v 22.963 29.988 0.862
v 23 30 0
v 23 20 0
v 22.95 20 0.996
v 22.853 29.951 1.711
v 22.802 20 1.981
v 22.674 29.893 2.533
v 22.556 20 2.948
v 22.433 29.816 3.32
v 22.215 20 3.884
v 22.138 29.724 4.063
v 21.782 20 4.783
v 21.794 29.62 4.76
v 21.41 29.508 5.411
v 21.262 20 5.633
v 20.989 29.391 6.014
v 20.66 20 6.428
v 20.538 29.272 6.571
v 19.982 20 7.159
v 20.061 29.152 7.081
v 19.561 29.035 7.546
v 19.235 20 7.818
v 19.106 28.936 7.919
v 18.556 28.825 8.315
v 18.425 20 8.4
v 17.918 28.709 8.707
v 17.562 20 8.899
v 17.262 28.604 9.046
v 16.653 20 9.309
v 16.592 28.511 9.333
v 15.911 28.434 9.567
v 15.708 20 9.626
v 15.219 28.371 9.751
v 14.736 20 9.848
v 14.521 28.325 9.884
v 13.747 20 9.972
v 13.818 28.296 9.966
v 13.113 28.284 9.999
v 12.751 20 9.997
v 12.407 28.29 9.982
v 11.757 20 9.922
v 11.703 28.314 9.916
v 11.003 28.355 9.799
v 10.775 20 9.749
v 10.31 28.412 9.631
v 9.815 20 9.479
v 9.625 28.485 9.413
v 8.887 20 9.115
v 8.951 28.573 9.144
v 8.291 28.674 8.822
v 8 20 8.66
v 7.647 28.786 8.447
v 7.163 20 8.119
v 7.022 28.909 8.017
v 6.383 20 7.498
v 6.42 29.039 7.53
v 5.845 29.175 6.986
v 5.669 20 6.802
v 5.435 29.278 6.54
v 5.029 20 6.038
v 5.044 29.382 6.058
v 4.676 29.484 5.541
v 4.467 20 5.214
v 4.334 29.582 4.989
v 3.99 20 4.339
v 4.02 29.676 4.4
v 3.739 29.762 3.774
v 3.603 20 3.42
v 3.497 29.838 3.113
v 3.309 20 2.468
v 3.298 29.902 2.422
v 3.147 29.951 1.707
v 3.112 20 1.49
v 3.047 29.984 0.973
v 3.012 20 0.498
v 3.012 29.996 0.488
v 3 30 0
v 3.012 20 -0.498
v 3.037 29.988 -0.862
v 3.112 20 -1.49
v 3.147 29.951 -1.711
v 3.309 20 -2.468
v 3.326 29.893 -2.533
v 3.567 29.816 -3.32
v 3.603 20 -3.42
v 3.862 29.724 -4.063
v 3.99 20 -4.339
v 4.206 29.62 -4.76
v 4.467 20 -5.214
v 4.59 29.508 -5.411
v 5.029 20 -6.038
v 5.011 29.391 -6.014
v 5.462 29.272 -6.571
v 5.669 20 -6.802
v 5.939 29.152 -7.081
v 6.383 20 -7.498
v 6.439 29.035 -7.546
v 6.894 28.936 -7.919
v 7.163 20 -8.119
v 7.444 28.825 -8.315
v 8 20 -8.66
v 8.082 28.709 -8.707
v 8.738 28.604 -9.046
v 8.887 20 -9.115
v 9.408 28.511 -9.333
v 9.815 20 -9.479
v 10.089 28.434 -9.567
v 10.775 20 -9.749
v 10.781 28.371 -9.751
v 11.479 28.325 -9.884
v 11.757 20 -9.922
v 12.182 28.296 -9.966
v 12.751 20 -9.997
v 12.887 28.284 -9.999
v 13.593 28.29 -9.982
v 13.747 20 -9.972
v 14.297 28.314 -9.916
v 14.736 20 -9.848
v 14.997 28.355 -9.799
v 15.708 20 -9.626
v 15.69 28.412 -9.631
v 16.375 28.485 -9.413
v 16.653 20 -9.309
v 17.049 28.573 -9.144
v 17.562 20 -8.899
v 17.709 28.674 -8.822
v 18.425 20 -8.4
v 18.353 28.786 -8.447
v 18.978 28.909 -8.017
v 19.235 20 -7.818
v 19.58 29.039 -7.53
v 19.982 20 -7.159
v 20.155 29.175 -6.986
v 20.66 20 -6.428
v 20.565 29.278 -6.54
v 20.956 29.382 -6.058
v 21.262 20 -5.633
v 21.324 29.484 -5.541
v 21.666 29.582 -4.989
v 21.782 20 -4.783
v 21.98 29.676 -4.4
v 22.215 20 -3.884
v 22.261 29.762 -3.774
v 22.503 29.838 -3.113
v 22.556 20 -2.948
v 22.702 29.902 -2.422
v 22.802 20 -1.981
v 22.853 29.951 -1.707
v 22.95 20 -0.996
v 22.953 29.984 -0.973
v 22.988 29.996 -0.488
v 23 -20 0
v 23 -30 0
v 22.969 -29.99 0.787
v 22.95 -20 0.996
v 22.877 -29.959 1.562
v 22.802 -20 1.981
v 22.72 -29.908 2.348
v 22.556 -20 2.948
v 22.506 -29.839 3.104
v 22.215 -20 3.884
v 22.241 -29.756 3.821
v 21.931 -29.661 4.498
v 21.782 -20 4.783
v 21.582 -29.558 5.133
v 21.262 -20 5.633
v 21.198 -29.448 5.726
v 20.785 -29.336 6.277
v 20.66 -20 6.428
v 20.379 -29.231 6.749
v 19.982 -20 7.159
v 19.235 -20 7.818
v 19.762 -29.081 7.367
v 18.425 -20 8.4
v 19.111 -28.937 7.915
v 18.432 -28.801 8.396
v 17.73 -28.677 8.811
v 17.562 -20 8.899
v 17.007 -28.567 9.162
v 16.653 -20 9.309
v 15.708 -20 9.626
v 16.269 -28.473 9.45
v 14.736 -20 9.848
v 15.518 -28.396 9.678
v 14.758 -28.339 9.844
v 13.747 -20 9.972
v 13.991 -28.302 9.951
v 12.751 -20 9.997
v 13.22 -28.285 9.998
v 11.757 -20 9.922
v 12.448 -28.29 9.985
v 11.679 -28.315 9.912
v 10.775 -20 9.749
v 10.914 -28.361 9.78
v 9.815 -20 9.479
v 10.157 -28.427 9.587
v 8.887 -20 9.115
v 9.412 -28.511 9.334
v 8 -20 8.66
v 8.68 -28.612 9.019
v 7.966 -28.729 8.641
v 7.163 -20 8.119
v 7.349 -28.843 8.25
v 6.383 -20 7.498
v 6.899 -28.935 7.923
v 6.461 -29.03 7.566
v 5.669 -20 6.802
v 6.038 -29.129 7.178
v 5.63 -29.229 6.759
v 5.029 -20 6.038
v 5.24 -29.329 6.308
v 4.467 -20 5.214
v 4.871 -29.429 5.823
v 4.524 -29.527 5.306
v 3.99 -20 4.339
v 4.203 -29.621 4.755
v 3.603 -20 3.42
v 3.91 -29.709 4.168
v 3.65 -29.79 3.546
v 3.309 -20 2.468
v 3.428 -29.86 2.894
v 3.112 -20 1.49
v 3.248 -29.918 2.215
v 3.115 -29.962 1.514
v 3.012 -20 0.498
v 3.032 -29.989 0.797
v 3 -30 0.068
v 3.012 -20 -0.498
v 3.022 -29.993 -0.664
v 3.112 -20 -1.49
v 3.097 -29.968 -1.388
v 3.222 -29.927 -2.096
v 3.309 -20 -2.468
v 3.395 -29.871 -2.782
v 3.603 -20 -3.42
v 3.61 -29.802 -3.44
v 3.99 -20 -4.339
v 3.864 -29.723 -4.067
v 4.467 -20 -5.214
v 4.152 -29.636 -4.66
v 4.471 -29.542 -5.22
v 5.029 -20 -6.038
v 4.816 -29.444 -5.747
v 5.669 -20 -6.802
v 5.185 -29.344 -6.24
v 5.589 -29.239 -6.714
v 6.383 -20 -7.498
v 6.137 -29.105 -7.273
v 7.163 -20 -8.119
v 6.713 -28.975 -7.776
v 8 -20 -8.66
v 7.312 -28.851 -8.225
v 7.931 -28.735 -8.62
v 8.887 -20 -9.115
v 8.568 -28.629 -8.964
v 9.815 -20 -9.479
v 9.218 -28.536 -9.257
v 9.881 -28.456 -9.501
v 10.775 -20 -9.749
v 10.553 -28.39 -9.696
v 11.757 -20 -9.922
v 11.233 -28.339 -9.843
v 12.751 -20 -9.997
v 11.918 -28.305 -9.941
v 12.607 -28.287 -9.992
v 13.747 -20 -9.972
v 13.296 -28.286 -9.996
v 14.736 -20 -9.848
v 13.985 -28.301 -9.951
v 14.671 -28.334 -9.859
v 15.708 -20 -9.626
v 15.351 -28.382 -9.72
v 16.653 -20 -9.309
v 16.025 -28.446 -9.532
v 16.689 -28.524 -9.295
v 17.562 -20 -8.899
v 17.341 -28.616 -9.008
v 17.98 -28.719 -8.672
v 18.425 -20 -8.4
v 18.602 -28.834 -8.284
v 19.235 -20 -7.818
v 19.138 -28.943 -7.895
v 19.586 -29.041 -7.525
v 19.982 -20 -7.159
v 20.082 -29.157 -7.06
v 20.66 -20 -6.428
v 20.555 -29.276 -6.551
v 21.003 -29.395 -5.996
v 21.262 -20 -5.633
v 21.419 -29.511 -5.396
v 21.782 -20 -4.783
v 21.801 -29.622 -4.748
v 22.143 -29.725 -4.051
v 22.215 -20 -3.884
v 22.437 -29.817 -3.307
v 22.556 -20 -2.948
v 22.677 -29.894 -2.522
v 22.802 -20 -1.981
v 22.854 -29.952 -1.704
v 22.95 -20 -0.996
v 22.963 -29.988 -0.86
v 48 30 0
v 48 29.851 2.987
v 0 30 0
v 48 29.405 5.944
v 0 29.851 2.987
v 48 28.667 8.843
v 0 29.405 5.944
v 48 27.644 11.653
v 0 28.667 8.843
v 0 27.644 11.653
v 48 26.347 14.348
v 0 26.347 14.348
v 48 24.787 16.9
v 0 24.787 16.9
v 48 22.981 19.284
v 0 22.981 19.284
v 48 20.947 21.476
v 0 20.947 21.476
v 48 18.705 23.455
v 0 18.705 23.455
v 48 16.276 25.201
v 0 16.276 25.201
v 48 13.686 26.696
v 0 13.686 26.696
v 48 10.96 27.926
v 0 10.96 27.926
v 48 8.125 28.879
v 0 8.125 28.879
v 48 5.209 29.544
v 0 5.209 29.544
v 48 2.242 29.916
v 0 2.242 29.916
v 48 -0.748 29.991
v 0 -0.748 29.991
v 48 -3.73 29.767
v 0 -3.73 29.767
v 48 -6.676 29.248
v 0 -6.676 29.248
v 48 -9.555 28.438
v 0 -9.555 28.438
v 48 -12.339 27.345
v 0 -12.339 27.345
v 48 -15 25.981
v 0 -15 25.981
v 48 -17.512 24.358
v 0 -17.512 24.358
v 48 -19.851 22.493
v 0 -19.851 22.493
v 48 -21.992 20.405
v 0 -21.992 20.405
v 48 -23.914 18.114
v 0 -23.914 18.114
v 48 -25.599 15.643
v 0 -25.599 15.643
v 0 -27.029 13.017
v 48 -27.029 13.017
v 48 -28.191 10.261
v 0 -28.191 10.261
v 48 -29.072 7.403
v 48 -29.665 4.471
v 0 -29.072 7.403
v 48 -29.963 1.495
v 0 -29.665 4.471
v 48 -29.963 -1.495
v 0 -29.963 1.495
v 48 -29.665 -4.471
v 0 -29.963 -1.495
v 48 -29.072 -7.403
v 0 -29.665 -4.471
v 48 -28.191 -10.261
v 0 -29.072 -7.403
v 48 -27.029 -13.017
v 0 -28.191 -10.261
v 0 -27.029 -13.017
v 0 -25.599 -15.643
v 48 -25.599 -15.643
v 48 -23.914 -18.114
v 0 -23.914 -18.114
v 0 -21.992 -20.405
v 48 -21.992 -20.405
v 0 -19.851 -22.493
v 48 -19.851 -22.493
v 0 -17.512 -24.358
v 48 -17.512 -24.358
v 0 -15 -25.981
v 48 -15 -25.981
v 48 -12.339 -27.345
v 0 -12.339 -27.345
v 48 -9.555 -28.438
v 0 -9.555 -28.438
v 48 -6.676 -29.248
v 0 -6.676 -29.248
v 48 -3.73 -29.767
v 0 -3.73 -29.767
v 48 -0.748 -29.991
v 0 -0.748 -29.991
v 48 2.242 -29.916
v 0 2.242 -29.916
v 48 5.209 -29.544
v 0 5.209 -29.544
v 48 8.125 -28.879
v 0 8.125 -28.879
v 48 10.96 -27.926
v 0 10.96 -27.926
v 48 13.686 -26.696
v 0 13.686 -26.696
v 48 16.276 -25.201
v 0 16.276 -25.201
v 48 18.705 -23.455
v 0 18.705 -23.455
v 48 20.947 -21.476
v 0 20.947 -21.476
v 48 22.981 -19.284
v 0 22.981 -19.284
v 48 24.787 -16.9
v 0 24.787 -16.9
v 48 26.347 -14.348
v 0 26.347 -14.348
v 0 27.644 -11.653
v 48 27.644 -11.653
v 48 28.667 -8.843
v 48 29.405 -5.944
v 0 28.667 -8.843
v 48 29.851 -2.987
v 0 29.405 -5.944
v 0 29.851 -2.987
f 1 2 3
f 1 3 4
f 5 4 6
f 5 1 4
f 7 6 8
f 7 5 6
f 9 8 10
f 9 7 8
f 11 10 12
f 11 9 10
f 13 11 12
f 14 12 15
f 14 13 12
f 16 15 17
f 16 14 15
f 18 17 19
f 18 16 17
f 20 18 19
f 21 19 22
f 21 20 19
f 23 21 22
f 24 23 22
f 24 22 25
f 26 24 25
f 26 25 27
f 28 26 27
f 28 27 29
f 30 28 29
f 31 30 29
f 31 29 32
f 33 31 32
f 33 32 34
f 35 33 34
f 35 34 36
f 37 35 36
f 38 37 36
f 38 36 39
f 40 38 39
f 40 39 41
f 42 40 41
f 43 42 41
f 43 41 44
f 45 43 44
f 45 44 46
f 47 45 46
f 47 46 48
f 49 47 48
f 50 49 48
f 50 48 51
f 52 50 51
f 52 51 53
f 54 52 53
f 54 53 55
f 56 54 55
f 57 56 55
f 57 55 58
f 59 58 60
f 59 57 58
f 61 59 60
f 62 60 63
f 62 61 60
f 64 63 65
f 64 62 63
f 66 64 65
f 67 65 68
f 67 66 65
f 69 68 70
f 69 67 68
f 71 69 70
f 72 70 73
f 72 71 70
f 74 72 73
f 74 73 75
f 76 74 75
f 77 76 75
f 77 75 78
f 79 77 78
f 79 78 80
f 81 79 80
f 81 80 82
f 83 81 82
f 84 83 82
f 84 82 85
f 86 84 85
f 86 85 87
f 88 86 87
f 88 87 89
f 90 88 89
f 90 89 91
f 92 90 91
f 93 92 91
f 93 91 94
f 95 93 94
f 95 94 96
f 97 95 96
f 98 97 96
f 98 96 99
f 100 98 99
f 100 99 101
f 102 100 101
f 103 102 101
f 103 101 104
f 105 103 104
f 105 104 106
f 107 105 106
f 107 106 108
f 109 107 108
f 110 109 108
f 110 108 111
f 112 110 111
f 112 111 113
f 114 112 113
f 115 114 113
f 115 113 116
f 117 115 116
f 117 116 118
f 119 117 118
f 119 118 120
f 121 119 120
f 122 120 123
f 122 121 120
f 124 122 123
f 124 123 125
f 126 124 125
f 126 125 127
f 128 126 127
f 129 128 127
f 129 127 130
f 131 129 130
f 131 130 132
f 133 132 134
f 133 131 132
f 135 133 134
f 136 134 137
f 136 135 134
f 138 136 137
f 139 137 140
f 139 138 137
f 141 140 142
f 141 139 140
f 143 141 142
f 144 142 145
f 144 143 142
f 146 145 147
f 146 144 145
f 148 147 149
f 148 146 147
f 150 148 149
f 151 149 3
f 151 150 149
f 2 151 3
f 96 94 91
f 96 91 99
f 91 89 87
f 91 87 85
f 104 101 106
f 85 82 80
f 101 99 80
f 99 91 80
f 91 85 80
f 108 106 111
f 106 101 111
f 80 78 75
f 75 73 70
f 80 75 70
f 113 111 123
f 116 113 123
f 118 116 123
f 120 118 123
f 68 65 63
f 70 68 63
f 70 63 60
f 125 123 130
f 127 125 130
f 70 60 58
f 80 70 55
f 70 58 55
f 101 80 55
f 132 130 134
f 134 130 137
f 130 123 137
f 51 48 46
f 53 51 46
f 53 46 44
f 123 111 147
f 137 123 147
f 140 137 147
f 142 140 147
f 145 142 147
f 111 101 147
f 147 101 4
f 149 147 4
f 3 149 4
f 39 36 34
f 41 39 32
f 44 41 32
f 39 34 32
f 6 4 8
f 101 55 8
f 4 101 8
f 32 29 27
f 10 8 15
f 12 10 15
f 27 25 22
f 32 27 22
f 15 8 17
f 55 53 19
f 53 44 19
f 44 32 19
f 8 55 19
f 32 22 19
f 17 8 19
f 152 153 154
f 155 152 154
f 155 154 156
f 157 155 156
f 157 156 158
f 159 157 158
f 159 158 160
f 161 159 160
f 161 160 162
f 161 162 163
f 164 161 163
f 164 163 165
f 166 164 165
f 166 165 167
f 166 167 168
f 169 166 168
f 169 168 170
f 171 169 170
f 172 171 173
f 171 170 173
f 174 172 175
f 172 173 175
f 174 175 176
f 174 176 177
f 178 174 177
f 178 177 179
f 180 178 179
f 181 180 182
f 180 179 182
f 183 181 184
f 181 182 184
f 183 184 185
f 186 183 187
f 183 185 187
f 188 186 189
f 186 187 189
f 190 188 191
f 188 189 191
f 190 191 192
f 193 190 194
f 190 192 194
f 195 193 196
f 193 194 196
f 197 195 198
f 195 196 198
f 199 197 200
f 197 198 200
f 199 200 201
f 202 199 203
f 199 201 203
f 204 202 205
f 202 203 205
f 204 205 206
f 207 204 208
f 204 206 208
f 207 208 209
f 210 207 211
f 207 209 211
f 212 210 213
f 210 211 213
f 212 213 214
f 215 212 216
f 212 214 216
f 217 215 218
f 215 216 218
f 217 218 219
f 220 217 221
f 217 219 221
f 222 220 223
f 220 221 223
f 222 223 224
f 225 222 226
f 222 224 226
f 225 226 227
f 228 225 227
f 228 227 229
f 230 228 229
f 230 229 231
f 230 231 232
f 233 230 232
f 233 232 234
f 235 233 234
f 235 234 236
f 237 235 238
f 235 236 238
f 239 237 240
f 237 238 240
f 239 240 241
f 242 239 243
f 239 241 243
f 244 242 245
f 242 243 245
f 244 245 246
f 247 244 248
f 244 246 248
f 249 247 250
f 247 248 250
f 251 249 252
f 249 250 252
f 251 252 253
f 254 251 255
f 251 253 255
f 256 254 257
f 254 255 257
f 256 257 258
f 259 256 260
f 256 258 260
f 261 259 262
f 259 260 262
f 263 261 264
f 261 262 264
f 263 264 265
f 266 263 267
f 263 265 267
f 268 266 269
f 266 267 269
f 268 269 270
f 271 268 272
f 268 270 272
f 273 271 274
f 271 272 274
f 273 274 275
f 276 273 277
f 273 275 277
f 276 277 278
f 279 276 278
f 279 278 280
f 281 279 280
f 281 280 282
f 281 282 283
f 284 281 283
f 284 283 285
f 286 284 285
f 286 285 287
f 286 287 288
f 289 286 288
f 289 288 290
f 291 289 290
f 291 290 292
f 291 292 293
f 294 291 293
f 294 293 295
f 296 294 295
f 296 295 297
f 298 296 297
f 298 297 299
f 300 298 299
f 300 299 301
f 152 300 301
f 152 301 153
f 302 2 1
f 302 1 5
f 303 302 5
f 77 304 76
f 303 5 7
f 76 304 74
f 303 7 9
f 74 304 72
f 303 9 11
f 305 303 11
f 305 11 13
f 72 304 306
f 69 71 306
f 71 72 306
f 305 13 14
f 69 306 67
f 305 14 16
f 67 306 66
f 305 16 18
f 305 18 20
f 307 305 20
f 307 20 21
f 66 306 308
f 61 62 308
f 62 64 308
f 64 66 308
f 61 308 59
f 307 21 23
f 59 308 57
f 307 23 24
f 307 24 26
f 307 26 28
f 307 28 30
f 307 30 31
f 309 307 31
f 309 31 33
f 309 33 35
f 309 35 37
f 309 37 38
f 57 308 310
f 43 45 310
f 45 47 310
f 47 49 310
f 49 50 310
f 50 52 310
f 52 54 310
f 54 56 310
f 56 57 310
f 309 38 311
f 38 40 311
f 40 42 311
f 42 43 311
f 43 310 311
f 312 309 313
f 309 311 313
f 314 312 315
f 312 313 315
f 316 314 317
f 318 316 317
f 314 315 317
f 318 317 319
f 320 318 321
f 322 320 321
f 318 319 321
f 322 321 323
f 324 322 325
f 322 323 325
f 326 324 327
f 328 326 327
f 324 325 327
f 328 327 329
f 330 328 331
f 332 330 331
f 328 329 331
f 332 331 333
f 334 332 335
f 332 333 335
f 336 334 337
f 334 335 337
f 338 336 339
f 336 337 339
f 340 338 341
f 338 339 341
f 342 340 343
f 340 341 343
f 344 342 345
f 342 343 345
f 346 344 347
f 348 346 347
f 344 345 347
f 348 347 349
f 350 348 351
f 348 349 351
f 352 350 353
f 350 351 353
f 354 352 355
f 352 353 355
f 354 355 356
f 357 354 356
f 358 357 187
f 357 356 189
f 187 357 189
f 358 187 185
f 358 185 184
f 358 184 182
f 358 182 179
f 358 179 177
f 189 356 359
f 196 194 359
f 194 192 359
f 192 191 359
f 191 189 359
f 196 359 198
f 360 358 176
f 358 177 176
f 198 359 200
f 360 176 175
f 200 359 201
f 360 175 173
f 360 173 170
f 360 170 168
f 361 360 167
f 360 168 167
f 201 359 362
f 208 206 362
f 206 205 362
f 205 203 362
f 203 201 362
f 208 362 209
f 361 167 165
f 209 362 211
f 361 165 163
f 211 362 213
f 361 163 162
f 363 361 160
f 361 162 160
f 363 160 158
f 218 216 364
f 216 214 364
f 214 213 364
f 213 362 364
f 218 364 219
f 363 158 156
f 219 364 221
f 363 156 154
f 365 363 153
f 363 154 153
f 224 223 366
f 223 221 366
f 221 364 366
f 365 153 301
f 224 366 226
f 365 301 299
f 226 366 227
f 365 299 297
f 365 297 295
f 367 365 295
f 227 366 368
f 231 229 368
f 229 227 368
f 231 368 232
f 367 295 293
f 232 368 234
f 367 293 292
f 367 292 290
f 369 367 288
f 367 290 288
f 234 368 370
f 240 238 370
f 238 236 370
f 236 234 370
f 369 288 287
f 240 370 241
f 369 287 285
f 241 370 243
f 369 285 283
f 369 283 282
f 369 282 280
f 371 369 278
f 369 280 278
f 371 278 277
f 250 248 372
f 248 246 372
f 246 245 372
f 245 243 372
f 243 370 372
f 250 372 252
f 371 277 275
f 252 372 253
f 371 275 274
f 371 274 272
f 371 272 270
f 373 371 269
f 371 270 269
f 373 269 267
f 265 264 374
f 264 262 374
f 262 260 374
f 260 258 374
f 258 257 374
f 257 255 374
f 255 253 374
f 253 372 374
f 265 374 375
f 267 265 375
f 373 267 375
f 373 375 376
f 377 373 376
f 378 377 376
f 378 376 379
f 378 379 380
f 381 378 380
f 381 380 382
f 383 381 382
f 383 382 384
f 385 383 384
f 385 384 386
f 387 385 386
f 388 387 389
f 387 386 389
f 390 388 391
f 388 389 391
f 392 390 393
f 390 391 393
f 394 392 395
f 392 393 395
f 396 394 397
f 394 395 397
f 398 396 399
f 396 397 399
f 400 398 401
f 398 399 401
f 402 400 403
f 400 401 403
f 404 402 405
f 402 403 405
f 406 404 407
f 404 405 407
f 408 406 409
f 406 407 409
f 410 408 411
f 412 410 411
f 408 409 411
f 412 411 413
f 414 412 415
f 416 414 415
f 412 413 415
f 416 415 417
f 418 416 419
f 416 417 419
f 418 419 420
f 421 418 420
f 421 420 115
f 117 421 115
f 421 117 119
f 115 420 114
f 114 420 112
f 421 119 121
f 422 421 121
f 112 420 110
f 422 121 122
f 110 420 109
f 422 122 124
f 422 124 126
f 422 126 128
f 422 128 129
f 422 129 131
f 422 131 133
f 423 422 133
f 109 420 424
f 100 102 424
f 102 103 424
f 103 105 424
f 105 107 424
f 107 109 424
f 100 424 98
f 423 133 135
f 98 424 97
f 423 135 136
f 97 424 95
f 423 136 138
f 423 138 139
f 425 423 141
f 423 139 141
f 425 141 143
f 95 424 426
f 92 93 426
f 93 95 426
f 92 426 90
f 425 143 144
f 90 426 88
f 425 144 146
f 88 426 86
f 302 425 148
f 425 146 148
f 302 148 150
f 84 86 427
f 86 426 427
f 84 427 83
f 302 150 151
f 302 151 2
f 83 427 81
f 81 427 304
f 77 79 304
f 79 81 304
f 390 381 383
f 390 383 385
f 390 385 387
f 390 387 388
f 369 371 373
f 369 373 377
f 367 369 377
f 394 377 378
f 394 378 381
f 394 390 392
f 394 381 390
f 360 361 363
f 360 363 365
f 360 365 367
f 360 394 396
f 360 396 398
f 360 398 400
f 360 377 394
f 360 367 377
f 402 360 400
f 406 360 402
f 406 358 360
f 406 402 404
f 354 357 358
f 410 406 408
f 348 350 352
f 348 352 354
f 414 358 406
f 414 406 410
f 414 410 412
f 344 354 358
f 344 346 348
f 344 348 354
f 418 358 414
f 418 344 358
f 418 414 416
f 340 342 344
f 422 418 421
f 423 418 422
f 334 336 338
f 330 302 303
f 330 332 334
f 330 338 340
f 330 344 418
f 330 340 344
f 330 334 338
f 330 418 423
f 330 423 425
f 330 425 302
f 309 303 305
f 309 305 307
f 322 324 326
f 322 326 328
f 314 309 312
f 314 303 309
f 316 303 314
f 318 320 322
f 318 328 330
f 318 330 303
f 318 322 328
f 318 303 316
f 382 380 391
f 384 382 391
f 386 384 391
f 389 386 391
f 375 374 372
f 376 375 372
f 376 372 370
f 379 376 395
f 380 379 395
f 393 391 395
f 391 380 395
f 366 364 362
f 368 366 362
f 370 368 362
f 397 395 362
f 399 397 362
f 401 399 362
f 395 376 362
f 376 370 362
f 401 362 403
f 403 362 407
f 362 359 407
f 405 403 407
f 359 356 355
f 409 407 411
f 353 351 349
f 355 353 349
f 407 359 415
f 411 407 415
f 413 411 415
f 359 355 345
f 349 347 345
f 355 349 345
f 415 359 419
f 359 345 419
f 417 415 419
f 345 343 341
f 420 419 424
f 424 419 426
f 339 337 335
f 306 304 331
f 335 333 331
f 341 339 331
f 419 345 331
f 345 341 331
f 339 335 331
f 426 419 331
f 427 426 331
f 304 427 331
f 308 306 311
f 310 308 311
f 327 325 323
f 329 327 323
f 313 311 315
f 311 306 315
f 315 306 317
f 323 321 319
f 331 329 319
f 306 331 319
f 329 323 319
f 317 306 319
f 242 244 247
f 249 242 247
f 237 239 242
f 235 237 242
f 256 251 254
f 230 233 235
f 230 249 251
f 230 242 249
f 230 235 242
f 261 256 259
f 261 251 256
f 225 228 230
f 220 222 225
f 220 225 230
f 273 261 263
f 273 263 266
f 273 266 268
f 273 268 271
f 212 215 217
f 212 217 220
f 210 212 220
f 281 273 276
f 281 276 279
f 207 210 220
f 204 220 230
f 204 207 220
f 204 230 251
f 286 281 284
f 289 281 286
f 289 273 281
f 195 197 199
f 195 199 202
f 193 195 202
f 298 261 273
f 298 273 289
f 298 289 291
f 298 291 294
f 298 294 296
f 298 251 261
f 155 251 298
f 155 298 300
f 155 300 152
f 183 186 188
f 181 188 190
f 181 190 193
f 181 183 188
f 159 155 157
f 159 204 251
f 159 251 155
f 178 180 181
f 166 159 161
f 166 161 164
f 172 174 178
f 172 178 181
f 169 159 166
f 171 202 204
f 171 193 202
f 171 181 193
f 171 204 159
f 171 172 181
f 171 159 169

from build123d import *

# Parameters (mm, degrees)
F0_R     = 30
F1_DEPTH = 48
F3_R     = 10
F4_DEPTH = 10
F6_R     = 10
F7_DEPTH = 10


with BuildPart() as f1:
    # F0 (on Right) → F1 (new body)
    with BuildSketch(Plane.YZ):
        Circle(F0_R)
    extrude(amount=F1_DEPTH)

    # F3 (on offset) → F4 (cut)
    with BuildSketch(Plane.XZ.offset(30)):
        with Locations((13, 0)):
            Circle(F3_R)
    extrude(amount=-F4_DEPTH, mode=Mode.SUBTRACT)

    # F6 (on offset) → F7 (cut)
    with BuildSketch(Plane.XZ.offset(-30)):
        with Locations((13, 0)):
            Circle(F6_R)
    extrude(amount=F7_DEPTH, mode=Mode.SUBTRACT)


solid = f1.part
